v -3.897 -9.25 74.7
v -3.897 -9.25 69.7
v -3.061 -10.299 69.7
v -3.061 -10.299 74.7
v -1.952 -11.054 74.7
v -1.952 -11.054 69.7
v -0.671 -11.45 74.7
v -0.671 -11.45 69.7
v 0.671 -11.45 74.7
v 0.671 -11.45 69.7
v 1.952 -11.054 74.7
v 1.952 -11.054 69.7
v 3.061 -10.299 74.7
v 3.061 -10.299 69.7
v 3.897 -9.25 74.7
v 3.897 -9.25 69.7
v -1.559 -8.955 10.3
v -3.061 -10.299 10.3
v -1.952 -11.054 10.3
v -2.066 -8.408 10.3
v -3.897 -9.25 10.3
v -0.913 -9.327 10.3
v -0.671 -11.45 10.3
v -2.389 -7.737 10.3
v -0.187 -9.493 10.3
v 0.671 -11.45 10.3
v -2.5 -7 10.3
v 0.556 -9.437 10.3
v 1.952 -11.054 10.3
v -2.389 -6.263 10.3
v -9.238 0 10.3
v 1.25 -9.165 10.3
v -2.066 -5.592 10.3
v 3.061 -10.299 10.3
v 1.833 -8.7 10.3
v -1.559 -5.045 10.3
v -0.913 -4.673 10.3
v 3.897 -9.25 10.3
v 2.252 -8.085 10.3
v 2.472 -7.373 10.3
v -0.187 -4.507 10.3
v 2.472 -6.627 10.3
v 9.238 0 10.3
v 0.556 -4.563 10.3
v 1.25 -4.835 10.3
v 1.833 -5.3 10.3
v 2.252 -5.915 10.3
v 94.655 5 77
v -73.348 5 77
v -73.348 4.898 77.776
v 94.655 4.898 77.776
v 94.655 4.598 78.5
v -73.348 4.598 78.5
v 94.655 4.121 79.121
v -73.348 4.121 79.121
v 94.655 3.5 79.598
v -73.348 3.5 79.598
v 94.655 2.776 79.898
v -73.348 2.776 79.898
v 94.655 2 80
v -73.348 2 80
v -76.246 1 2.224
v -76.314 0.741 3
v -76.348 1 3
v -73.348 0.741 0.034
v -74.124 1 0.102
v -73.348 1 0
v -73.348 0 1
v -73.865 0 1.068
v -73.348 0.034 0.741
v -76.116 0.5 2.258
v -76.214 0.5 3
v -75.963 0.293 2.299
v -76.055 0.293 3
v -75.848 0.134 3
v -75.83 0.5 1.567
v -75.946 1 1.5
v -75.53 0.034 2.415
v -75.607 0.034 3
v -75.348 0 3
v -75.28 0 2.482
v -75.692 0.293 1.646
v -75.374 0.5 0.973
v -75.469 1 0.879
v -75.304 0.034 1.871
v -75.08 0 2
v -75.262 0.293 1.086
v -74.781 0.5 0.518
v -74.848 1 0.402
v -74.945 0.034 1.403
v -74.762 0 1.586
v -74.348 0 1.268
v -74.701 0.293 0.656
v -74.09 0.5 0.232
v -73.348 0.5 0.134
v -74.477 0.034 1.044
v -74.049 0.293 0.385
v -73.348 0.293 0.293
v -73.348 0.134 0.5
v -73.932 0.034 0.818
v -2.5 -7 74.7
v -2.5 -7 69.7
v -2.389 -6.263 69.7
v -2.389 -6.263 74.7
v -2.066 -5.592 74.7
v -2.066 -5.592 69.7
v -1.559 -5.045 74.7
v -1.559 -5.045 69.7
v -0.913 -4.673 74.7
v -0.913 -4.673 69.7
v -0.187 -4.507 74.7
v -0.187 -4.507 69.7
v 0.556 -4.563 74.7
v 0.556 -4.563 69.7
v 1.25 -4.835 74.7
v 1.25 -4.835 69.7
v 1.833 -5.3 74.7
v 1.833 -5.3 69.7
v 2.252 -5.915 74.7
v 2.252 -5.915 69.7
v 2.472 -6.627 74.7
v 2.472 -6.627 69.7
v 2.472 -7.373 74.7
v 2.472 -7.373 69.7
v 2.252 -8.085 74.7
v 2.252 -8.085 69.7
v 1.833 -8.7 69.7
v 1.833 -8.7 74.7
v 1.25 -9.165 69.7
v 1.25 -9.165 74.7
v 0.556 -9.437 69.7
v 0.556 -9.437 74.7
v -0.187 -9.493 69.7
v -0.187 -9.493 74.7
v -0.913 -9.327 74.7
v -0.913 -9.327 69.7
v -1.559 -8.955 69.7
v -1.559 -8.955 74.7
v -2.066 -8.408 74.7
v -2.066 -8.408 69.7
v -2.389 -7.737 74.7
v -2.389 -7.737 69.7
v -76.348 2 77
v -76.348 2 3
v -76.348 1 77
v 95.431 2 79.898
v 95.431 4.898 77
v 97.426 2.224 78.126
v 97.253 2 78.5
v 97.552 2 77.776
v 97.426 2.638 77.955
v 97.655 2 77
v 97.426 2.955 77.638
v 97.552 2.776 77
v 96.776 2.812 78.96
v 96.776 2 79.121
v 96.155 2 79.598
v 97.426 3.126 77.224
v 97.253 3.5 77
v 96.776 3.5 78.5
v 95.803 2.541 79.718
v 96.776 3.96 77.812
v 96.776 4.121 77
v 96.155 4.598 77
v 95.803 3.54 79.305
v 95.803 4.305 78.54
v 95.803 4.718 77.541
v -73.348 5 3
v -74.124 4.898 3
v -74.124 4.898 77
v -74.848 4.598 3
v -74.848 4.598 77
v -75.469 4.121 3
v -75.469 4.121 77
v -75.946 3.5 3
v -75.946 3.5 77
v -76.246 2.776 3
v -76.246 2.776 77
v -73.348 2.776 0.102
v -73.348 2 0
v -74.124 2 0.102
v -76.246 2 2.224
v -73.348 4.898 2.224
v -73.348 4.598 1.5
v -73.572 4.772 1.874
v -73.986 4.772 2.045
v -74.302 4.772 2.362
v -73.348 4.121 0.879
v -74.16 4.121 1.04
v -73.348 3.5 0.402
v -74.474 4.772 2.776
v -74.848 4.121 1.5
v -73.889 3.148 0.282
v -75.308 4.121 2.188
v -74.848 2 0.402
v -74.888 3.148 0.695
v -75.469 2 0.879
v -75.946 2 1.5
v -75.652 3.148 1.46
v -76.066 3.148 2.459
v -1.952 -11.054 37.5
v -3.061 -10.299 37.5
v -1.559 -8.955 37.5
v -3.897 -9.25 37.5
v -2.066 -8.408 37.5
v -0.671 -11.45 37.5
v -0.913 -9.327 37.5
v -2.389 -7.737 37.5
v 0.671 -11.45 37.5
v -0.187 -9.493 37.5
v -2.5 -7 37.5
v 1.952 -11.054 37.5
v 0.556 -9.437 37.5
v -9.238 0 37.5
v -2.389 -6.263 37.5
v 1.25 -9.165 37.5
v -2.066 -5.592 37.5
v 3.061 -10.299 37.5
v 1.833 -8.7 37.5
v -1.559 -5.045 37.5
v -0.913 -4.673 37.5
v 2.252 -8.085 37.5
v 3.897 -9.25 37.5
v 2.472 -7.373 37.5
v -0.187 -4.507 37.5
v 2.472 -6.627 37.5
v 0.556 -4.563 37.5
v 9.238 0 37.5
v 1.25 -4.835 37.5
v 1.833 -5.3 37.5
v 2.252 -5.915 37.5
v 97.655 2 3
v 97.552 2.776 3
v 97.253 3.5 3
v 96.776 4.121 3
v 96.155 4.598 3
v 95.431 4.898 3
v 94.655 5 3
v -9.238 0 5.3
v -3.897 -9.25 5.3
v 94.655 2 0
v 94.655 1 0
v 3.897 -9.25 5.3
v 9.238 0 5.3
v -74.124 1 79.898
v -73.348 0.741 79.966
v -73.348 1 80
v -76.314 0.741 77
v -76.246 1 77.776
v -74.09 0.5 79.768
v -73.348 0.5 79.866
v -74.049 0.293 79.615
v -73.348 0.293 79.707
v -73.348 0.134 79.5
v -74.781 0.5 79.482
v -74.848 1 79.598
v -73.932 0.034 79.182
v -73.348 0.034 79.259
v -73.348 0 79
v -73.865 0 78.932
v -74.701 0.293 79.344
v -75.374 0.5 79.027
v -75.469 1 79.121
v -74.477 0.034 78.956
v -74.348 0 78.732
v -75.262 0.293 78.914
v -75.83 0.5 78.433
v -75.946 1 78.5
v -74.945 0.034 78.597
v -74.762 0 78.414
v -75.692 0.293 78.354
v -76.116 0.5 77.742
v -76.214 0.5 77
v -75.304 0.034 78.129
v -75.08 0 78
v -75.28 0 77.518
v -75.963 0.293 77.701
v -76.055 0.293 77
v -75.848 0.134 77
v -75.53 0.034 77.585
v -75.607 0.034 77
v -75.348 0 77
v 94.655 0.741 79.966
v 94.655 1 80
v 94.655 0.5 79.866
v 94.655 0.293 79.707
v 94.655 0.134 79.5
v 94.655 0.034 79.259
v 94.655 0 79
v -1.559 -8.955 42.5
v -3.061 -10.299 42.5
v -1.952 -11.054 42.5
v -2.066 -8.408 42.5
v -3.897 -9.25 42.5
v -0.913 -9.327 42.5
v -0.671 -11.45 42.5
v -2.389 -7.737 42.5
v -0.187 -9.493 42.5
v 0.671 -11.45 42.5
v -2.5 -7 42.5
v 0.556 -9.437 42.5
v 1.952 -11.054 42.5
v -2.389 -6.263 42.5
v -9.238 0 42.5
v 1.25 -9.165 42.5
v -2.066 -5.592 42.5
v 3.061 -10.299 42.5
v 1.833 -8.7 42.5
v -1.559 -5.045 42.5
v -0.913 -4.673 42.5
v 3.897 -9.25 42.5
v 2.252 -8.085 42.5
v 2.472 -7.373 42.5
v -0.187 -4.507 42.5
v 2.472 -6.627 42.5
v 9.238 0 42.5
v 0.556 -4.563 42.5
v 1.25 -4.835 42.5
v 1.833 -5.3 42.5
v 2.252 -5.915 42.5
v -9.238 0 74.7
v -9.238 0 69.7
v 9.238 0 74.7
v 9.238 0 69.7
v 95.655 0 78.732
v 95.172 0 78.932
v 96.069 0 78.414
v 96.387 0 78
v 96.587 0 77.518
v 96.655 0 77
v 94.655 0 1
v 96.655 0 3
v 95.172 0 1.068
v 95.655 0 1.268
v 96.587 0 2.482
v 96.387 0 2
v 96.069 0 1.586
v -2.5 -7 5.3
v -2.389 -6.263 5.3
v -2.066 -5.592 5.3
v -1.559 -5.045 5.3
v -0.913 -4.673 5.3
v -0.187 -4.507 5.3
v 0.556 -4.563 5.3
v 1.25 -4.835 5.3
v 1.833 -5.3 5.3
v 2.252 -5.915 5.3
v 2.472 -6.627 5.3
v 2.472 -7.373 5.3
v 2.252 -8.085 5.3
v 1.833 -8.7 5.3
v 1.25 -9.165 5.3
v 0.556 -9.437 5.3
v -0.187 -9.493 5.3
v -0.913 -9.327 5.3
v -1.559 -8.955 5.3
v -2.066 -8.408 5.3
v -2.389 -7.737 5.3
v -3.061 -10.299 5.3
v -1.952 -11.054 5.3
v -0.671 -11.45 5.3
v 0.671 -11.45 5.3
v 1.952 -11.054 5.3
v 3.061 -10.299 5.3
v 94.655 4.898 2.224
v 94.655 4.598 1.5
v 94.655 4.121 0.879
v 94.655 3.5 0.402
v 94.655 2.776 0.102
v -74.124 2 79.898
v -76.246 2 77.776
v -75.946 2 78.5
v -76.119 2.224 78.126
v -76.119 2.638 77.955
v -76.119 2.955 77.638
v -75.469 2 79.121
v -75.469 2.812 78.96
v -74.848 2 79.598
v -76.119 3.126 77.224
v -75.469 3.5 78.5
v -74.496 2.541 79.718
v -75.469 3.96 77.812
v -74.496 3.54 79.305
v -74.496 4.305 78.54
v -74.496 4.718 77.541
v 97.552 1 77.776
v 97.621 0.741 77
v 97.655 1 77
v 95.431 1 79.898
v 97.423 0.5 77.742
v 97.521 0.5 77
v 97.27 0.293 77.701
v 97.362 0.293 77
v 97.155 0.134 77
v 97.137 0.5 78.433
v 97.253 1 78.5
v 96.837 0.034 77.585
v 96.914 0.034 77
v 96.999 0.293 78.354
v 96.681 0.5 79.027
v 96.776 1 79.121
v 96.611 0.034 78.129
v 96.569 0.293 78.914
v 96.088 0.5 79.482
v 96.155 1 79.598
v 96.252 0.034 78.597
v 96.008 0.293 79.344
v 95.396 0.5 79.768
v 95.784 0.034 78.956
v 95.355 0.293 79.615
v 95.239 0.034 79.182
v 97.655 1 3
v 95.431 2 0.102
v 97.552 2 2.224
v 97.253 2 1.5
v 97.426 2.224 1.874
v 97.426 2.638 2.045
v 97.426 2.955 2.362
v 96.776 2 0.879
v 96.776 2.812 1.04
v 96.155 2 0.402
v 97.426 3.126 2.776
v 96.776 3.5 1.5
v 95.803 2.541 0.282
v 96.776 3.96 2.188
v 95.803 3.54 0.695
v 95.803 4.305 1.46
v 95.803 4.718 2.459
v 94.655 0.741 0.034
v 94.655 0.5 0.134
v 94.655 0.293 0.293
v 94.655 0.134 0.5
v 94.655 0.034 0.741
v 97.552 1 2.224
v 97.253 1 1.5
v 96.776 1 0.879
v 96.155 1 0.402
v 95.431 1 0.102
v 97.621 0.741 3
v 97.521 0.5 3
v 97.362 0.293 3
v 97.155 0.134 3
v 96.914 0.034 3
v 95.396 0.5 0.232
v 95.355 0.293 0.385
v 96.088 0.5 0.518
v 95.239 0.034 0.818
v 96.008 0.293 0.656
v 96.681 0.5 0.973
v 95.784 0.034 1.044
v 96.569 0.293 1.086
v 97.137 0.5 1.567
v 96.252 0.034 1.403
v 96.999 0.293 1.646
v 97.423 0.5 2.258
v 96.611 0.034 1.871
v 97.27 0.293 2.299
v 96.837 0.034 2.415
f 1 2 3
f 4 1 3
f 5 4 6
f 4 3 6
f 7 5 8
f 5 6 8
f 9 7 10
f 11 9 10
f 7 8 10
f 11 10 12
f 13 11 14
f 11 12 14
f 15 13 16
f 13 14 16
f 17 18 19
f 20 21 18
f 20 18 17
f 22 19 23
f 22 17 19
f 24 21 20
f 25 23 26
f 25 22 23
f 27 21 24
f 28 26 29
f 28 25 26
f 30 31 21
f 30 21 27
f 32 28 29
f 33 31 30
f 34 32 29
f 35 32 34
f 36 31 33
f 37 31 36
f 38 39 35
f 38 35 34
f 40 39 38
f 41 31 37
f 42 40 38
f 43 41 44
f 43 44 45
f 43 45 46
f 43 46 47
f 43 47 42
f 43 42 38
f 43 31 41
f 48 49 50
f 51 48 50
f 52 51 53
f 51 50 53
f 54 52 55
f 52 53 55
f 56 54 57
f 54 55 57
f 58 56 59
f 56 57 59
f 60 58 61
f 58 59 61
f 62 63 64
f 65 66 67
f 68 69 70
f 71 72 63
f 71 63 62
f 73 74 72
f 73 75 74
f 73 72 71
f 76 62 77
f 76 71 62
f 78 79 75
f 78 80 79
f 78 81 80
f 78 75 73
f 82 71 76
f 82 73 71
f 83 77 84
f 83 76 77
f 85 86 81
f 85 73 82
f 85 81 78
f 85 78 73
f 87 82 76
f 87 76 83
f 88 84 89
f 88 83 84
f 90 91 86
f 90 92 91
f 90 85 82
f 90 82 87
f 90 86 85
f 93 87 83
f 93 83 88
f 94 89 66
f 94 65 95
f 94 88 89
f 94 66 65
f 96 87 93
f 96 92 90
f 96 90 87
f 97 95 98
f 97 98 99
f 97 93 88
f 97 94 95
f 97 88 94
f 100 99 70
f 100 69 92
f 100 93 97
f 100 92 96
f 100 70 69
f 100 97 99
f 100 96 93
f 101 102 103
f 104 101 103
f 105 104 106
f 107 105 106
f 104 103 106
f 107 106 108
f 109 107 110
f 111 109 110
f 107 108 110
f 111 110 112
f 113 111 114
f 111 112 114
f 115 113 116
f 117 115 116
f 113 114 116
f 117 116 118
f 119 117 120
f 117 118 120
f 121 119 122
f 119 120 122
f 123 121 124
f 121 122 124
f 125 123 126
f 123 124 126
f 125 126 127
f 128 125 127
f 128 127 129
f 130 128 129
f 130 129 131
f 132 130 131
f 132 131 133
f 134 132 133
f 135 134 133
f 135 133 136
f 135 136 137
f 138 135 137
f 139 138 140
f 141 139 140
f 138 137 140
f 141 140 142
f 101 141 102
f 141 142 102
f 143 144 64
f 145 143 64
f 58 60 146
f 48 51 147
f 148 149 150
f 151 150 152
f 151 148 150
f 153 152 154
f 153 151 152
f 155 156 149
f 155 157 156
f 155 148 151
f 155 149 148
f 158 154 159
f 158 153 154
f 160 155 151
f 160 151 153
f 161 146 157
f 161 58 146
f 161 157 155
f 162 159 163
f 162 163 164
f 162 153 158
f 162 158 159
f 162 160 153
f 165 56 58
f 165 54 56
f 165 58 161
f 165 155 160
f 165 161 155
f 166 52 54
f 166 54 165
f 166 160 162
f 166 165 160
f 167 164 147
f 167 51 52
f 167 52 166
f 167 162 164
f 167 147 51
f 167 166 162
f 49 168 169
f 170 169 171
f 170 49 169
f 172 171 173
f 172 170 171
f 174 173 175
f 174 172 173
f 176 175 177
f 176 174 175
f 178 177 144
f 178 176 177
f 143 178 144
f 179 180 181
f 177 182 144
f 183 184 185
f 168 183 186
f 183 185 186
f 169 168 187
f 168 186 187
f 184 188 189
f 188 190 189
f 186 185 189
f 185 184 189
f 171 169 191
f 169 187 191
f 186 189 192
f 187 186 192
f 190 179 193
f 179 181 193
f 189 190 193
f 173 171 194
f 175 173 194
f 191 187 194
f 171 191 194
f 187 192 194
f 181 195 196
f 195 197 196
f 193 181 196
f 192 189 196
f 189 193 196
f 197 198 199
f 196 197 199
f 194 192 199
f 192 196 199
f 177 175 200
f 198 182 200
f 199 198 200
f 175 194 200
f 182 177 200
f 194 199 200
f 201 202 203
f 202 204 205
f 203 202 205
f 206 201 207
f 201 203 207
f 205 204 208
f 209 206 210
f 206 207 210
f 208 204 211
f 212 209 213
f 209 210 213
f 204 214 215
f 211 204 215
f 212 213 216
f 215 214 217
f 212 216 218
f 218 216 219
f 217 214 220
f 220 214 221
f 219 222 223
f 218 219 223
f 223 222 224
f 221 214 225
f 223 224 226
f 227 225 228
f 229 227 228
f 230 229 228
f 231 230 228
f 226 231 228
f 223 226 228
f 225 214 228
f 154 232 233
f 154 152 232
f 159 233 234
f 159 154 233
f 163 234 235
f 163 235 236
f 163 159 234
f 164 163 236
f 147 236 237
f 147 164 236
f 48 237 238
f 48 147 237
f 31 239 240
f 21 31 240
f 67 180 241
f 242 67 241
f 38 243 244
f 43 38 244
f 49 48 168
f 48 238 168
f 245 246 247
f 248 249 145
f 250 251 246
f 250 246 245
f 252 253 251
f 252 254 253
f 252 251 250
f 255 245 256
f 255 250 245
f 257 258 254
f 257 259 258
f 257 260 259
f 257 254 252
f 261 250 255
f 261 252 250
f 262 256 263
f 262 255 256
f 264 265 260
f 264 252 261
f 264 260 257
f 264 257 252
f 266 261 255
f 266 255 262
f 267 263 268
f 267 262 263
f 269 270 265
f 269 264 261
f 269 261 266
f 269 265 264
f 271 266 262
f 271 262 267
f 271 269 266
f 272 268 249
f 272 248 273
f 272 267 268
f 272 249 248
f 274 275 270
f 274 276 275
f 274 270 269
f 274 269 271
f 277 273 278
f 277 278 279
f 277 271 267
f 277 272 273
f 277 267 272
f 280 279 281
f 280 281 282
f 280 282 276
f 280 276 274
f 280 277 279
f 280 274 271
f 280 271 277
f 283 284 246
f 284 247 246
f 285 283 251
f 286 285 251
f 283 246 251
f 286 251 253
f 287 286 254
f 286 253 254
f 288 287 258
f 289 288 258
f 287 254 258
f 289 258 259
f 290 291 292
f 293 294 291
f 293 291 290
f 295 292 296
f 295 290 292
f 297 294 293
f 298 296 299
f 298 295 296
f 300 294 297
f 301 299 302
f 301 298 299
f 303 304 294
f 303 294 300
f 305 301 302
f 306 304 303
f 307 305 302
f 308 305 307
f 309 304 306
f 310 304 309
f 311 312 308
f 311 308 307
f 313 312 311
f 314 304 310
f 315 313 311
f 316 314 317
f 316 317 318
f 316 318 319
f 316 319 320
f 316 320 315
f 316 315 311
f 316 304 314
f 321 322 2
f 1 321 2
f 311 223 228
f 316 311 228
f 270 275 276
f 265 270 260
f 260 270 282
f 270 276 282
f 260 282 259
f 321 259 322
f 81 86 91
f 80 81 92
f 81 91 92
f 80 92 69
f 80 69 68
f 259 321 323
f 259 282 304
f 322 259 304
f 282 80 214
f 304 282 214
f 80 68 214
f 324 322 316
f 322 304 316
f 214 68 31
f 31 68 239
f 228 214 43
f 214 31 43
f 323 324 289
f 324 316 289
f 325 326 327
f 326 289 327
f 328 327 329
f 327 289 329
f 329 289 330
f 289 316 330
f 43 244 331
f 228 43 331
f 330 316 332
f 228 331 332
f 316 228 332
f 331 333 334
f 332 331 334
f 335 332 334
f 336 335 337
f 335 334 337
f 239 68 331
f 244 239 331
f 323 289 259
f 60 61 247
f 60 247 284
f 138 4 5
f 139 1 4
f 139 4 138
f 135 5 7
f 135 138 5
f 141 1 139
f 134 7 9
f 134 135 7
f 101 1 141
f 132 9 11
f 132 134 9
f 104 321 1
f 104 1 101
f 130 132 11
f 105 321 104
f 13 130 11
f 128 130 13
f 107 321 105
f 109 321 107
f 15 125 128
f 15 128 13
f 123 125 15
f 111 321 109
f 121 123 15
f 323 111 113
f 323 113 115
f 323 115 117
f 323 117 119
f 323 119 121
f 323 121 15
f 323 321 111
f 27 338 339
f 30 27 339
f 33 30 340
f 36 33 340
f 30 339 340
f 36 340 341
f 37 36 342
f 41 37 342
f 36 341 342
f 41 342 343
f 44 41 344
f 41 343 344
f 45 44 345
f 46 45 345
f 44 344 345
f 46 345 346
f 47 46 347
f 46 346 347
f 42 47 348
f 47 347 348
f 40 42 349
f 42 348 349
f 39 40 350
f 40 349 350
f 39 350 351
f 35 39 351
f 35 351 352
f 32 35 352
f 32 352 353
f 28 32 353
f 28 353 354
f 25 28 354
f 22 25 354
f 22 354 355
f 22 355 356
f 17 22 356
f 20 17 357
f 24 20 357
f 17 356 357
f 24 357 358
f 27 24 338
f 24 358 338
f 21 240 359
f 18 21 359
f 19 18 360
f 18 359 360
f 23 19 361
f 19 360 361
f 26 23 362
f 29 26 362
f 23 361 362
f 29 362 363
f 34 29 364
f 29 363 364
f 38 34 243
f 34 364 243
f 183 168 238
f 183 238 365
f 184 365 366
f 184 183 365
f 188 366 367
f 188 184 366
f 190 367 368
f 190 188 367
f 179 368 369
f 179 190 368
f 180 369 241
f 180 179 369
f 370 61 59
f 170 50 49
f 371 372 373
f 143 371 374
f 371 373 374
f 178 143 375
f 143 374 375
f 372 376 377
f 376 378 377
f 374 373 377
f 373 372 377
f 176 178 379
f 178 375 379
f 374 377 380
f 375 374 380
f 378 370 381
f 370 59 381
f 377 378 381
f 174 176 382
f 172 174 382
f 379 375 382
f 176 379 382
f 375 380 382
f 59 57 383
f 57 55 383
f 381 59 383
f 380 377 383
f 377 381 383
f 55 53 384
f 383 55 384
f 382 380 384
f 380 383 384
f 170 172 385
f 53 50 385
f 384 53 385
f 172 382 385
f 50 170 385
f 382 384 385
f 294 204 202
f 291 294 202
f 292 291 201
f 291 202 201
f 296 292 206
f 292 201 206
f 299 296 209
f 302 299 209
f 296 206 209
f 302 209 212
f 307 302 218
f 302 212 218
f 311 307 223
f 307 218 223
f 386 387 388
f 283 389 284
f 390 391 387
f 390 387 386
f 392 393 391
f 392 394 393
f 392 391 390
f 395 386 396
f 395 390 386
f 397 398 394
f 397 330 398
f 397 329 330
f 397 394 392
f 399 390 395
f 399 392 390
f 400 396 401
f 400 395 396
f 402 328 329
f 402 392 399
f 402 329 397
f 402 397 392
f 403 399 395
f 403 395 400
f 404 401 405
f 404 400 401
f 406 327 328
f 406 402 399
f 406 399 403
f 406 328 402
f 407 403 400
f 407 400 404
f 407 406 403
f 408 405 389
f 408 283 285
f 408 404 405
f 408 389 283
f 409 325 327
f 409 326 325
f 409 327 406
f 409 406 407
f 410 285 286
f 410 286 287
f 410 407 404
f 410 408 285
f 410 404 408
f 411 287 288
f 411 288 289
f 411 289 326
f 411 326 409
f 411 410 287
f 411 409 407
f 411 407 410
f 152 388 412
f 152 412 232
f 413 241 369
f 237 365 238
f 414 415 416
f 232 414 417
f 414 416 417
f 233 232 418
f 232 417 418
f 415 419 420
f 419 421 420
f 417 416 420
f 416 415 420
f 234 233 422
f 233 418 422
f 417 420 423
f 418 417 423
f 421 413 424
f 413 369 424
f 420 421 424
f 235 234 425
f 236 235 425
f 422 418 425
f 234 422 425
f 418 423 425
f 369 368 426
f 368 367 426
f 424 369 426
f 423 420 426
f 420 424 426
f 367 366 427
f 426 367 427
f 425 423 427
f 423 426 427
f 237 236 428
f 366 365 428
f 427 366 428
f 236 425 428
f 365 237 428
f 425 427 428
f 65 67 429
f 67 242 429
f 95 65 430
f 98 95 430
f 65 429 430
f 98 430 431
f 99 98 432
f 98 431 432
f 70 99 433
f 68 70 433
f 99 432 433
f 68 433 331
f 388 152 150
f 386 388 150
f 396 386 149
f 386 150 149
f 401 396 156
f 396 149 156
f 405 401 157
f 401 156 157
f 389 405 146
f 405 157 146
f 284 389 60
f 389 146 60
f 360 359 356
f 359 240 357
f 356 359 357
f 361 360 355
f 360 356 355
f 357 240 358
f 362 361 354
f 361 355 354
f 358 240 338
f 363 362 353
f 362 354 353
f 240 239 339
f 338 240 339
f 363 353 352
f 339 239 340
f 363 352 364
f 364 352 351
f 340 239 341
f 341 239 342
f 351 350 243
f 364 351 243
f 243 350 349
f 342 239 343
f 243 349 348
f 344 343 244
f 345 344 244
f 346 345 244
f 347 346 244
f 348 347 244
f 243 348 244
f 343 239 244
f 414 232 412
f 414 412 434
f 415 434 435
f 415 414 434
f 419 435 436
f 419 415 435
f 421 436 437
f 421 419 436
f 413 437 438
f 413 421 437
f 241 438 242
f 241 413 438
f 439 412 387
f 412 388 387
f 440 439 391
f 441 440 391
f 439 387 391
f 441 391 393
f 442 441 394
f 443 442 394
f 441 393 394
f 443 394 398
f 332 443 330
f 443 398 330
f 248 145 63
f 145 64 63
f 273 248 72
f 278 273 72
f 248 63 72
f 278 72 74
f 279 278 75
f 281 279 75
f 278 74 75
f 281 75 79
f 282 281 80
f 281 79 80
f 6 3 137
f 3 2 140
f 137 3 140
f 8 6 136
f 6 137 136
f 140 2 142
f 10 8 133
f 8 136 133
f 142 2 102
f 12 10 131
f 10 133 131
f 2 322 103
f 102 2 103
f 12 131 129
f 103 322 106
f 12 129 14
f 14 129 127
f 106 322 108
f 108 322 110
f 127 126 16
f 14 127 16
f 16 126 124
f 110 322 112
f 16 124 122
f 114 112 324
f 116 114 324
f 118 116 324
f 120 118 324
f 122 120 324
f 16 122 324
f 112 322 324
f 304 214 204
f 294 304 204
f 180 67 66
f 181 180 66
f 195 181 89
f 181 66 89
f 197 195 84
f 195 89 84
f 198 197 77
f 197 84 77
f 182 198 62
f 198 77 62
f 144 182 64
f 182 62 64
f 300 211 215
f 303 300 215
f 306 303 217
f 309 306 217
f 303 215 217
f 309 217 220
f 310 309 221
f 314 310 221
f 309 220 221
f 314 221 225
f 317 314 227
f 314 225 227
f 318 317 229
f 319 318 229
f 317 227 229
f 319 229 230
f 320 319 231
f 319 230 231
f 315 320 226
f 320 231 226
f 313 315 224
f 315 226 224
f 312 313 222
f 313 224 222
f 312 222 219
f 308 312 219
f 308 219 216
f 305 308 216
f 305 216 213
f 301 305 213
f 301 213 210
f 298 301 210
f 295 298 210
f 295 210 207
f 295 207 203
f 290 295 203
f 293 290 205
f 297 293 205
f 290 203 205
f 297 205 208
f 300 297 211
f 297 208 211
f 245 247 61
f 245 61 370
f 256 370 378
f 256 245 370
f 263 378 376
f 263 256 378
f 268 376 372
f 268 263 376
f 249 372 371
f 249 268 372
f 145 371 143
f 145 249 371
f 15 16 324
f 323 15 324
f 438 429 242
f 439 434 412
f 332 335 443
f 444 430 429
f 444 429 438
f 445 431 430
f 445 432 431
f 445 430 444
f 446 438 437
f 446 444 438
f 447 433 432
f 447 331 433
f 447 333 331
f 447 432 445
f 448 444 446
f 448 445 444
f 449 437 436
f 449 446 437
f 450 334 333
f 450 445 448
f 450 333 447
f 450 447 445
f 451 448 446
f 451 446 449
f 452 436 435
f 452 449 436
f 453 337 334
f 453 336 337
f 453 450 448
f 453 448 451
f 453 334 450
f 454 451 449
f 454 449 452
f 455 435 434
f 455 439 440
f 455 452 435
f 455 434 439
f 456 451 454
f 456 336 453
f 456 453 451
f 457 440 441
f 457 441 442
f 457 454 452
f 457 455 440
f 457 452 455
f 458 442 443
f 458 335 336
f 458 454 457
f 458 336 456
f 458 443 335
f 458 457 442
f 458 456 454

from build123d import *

# Parameters (mm, degrees)
BOSS_EXTRUDE3_DEPTH = 80
BOSS_EXTRUDE2_START = -5.3
SKETCH2_R           = 2.5
BOSS_EXTRUDE2_DEPTH = 5
LPATTERN1_COUNT     = 3
LPATTERN1_PITCH     = 32.2
FILLET1_R           = 3
FILLET2_R           = 1


with BuildPart() as part:
    # Sketch3 → Boss-Extrude3 (new body)
    with BuildSketch(Plane.XY):
        Polygon((97.654693799, 0), (97.654693799, 5), (-76.347854423, 5), (-76.347854423, 0), (0, 0), align=None)
    extrude(amount=BOSS_EXTRUDE3_DEPTH)

    # Sketch2 → Boss-Extrude2 (add)
    with BuildSketch(Plane(origin=(0, 0, 0), x_dir=(-1, 0, 0), z_dir=(0, 0, -1)).offset(BOSS_EXTRUDE2_START)):
        with BuildLine():
            Line((-3.897114317, -9.25), (-9.237604307, 0))
            Line((-9.237604307, 0), (9.237604307, 0))
            Line((9.237604307, 0), (3.897114317, -9.25))
            ThreePointArc((3.897114317, -9.25), (0, -11.5), (-3.897114317, -9.25))
        make_face()
        with Locations((0, -7)):
            Circle(SKETCH2_R, mode=Mode.SUBTRACT)
    boss_extrude2 = extrude(amount=-BOSS_EXTRUDE2_DEPTH)

    # LPattern1: Boss-Extrude2 ×3
    with Locations(*[(0, 0, i * LPATTERN1_PITCH) for i in range(1, LPATTERN1_COUNT)]):
        add(boss_extrude2)

    # Fillet1
    fillet1_edges = [part.edges().sort_by_distance(p)[0] for p in [
        (10.653419688, 5, 80),
        (-76.347854423, 2.5, 80),
        (-76.347854423, 2.5, 0),
        (10.653419688, 5, 0),
        (97.654693799, 2.5, 0),
        (97.654693799, 2.5, 80),
        (-76.347854423, 5, 40),
        (97.654693799, 5, 40),
    ]]
    fillet(fillet1_edges, radius=FILLET1_R)

    # Fillet2
    fillet2_edges = [part.edges().sort_by_distance(p)[0] for p in [
        (97.654693799, 0, 40),
        (10.653419688, 0, 0),
        (-76.347854423, 0, 40),
        (10.653419688, 0, 80),
        (96.776014142, 0, 0.878679656),
        (-75.469174766, 0, 0.878679656),
        (-75.469174766, 0, 79.121320344),
        (96.776014142, 0, 79.121320344),
    ]]
    fillet(fillet2_edges, radius=FILLET2_R)


solid = part.part
